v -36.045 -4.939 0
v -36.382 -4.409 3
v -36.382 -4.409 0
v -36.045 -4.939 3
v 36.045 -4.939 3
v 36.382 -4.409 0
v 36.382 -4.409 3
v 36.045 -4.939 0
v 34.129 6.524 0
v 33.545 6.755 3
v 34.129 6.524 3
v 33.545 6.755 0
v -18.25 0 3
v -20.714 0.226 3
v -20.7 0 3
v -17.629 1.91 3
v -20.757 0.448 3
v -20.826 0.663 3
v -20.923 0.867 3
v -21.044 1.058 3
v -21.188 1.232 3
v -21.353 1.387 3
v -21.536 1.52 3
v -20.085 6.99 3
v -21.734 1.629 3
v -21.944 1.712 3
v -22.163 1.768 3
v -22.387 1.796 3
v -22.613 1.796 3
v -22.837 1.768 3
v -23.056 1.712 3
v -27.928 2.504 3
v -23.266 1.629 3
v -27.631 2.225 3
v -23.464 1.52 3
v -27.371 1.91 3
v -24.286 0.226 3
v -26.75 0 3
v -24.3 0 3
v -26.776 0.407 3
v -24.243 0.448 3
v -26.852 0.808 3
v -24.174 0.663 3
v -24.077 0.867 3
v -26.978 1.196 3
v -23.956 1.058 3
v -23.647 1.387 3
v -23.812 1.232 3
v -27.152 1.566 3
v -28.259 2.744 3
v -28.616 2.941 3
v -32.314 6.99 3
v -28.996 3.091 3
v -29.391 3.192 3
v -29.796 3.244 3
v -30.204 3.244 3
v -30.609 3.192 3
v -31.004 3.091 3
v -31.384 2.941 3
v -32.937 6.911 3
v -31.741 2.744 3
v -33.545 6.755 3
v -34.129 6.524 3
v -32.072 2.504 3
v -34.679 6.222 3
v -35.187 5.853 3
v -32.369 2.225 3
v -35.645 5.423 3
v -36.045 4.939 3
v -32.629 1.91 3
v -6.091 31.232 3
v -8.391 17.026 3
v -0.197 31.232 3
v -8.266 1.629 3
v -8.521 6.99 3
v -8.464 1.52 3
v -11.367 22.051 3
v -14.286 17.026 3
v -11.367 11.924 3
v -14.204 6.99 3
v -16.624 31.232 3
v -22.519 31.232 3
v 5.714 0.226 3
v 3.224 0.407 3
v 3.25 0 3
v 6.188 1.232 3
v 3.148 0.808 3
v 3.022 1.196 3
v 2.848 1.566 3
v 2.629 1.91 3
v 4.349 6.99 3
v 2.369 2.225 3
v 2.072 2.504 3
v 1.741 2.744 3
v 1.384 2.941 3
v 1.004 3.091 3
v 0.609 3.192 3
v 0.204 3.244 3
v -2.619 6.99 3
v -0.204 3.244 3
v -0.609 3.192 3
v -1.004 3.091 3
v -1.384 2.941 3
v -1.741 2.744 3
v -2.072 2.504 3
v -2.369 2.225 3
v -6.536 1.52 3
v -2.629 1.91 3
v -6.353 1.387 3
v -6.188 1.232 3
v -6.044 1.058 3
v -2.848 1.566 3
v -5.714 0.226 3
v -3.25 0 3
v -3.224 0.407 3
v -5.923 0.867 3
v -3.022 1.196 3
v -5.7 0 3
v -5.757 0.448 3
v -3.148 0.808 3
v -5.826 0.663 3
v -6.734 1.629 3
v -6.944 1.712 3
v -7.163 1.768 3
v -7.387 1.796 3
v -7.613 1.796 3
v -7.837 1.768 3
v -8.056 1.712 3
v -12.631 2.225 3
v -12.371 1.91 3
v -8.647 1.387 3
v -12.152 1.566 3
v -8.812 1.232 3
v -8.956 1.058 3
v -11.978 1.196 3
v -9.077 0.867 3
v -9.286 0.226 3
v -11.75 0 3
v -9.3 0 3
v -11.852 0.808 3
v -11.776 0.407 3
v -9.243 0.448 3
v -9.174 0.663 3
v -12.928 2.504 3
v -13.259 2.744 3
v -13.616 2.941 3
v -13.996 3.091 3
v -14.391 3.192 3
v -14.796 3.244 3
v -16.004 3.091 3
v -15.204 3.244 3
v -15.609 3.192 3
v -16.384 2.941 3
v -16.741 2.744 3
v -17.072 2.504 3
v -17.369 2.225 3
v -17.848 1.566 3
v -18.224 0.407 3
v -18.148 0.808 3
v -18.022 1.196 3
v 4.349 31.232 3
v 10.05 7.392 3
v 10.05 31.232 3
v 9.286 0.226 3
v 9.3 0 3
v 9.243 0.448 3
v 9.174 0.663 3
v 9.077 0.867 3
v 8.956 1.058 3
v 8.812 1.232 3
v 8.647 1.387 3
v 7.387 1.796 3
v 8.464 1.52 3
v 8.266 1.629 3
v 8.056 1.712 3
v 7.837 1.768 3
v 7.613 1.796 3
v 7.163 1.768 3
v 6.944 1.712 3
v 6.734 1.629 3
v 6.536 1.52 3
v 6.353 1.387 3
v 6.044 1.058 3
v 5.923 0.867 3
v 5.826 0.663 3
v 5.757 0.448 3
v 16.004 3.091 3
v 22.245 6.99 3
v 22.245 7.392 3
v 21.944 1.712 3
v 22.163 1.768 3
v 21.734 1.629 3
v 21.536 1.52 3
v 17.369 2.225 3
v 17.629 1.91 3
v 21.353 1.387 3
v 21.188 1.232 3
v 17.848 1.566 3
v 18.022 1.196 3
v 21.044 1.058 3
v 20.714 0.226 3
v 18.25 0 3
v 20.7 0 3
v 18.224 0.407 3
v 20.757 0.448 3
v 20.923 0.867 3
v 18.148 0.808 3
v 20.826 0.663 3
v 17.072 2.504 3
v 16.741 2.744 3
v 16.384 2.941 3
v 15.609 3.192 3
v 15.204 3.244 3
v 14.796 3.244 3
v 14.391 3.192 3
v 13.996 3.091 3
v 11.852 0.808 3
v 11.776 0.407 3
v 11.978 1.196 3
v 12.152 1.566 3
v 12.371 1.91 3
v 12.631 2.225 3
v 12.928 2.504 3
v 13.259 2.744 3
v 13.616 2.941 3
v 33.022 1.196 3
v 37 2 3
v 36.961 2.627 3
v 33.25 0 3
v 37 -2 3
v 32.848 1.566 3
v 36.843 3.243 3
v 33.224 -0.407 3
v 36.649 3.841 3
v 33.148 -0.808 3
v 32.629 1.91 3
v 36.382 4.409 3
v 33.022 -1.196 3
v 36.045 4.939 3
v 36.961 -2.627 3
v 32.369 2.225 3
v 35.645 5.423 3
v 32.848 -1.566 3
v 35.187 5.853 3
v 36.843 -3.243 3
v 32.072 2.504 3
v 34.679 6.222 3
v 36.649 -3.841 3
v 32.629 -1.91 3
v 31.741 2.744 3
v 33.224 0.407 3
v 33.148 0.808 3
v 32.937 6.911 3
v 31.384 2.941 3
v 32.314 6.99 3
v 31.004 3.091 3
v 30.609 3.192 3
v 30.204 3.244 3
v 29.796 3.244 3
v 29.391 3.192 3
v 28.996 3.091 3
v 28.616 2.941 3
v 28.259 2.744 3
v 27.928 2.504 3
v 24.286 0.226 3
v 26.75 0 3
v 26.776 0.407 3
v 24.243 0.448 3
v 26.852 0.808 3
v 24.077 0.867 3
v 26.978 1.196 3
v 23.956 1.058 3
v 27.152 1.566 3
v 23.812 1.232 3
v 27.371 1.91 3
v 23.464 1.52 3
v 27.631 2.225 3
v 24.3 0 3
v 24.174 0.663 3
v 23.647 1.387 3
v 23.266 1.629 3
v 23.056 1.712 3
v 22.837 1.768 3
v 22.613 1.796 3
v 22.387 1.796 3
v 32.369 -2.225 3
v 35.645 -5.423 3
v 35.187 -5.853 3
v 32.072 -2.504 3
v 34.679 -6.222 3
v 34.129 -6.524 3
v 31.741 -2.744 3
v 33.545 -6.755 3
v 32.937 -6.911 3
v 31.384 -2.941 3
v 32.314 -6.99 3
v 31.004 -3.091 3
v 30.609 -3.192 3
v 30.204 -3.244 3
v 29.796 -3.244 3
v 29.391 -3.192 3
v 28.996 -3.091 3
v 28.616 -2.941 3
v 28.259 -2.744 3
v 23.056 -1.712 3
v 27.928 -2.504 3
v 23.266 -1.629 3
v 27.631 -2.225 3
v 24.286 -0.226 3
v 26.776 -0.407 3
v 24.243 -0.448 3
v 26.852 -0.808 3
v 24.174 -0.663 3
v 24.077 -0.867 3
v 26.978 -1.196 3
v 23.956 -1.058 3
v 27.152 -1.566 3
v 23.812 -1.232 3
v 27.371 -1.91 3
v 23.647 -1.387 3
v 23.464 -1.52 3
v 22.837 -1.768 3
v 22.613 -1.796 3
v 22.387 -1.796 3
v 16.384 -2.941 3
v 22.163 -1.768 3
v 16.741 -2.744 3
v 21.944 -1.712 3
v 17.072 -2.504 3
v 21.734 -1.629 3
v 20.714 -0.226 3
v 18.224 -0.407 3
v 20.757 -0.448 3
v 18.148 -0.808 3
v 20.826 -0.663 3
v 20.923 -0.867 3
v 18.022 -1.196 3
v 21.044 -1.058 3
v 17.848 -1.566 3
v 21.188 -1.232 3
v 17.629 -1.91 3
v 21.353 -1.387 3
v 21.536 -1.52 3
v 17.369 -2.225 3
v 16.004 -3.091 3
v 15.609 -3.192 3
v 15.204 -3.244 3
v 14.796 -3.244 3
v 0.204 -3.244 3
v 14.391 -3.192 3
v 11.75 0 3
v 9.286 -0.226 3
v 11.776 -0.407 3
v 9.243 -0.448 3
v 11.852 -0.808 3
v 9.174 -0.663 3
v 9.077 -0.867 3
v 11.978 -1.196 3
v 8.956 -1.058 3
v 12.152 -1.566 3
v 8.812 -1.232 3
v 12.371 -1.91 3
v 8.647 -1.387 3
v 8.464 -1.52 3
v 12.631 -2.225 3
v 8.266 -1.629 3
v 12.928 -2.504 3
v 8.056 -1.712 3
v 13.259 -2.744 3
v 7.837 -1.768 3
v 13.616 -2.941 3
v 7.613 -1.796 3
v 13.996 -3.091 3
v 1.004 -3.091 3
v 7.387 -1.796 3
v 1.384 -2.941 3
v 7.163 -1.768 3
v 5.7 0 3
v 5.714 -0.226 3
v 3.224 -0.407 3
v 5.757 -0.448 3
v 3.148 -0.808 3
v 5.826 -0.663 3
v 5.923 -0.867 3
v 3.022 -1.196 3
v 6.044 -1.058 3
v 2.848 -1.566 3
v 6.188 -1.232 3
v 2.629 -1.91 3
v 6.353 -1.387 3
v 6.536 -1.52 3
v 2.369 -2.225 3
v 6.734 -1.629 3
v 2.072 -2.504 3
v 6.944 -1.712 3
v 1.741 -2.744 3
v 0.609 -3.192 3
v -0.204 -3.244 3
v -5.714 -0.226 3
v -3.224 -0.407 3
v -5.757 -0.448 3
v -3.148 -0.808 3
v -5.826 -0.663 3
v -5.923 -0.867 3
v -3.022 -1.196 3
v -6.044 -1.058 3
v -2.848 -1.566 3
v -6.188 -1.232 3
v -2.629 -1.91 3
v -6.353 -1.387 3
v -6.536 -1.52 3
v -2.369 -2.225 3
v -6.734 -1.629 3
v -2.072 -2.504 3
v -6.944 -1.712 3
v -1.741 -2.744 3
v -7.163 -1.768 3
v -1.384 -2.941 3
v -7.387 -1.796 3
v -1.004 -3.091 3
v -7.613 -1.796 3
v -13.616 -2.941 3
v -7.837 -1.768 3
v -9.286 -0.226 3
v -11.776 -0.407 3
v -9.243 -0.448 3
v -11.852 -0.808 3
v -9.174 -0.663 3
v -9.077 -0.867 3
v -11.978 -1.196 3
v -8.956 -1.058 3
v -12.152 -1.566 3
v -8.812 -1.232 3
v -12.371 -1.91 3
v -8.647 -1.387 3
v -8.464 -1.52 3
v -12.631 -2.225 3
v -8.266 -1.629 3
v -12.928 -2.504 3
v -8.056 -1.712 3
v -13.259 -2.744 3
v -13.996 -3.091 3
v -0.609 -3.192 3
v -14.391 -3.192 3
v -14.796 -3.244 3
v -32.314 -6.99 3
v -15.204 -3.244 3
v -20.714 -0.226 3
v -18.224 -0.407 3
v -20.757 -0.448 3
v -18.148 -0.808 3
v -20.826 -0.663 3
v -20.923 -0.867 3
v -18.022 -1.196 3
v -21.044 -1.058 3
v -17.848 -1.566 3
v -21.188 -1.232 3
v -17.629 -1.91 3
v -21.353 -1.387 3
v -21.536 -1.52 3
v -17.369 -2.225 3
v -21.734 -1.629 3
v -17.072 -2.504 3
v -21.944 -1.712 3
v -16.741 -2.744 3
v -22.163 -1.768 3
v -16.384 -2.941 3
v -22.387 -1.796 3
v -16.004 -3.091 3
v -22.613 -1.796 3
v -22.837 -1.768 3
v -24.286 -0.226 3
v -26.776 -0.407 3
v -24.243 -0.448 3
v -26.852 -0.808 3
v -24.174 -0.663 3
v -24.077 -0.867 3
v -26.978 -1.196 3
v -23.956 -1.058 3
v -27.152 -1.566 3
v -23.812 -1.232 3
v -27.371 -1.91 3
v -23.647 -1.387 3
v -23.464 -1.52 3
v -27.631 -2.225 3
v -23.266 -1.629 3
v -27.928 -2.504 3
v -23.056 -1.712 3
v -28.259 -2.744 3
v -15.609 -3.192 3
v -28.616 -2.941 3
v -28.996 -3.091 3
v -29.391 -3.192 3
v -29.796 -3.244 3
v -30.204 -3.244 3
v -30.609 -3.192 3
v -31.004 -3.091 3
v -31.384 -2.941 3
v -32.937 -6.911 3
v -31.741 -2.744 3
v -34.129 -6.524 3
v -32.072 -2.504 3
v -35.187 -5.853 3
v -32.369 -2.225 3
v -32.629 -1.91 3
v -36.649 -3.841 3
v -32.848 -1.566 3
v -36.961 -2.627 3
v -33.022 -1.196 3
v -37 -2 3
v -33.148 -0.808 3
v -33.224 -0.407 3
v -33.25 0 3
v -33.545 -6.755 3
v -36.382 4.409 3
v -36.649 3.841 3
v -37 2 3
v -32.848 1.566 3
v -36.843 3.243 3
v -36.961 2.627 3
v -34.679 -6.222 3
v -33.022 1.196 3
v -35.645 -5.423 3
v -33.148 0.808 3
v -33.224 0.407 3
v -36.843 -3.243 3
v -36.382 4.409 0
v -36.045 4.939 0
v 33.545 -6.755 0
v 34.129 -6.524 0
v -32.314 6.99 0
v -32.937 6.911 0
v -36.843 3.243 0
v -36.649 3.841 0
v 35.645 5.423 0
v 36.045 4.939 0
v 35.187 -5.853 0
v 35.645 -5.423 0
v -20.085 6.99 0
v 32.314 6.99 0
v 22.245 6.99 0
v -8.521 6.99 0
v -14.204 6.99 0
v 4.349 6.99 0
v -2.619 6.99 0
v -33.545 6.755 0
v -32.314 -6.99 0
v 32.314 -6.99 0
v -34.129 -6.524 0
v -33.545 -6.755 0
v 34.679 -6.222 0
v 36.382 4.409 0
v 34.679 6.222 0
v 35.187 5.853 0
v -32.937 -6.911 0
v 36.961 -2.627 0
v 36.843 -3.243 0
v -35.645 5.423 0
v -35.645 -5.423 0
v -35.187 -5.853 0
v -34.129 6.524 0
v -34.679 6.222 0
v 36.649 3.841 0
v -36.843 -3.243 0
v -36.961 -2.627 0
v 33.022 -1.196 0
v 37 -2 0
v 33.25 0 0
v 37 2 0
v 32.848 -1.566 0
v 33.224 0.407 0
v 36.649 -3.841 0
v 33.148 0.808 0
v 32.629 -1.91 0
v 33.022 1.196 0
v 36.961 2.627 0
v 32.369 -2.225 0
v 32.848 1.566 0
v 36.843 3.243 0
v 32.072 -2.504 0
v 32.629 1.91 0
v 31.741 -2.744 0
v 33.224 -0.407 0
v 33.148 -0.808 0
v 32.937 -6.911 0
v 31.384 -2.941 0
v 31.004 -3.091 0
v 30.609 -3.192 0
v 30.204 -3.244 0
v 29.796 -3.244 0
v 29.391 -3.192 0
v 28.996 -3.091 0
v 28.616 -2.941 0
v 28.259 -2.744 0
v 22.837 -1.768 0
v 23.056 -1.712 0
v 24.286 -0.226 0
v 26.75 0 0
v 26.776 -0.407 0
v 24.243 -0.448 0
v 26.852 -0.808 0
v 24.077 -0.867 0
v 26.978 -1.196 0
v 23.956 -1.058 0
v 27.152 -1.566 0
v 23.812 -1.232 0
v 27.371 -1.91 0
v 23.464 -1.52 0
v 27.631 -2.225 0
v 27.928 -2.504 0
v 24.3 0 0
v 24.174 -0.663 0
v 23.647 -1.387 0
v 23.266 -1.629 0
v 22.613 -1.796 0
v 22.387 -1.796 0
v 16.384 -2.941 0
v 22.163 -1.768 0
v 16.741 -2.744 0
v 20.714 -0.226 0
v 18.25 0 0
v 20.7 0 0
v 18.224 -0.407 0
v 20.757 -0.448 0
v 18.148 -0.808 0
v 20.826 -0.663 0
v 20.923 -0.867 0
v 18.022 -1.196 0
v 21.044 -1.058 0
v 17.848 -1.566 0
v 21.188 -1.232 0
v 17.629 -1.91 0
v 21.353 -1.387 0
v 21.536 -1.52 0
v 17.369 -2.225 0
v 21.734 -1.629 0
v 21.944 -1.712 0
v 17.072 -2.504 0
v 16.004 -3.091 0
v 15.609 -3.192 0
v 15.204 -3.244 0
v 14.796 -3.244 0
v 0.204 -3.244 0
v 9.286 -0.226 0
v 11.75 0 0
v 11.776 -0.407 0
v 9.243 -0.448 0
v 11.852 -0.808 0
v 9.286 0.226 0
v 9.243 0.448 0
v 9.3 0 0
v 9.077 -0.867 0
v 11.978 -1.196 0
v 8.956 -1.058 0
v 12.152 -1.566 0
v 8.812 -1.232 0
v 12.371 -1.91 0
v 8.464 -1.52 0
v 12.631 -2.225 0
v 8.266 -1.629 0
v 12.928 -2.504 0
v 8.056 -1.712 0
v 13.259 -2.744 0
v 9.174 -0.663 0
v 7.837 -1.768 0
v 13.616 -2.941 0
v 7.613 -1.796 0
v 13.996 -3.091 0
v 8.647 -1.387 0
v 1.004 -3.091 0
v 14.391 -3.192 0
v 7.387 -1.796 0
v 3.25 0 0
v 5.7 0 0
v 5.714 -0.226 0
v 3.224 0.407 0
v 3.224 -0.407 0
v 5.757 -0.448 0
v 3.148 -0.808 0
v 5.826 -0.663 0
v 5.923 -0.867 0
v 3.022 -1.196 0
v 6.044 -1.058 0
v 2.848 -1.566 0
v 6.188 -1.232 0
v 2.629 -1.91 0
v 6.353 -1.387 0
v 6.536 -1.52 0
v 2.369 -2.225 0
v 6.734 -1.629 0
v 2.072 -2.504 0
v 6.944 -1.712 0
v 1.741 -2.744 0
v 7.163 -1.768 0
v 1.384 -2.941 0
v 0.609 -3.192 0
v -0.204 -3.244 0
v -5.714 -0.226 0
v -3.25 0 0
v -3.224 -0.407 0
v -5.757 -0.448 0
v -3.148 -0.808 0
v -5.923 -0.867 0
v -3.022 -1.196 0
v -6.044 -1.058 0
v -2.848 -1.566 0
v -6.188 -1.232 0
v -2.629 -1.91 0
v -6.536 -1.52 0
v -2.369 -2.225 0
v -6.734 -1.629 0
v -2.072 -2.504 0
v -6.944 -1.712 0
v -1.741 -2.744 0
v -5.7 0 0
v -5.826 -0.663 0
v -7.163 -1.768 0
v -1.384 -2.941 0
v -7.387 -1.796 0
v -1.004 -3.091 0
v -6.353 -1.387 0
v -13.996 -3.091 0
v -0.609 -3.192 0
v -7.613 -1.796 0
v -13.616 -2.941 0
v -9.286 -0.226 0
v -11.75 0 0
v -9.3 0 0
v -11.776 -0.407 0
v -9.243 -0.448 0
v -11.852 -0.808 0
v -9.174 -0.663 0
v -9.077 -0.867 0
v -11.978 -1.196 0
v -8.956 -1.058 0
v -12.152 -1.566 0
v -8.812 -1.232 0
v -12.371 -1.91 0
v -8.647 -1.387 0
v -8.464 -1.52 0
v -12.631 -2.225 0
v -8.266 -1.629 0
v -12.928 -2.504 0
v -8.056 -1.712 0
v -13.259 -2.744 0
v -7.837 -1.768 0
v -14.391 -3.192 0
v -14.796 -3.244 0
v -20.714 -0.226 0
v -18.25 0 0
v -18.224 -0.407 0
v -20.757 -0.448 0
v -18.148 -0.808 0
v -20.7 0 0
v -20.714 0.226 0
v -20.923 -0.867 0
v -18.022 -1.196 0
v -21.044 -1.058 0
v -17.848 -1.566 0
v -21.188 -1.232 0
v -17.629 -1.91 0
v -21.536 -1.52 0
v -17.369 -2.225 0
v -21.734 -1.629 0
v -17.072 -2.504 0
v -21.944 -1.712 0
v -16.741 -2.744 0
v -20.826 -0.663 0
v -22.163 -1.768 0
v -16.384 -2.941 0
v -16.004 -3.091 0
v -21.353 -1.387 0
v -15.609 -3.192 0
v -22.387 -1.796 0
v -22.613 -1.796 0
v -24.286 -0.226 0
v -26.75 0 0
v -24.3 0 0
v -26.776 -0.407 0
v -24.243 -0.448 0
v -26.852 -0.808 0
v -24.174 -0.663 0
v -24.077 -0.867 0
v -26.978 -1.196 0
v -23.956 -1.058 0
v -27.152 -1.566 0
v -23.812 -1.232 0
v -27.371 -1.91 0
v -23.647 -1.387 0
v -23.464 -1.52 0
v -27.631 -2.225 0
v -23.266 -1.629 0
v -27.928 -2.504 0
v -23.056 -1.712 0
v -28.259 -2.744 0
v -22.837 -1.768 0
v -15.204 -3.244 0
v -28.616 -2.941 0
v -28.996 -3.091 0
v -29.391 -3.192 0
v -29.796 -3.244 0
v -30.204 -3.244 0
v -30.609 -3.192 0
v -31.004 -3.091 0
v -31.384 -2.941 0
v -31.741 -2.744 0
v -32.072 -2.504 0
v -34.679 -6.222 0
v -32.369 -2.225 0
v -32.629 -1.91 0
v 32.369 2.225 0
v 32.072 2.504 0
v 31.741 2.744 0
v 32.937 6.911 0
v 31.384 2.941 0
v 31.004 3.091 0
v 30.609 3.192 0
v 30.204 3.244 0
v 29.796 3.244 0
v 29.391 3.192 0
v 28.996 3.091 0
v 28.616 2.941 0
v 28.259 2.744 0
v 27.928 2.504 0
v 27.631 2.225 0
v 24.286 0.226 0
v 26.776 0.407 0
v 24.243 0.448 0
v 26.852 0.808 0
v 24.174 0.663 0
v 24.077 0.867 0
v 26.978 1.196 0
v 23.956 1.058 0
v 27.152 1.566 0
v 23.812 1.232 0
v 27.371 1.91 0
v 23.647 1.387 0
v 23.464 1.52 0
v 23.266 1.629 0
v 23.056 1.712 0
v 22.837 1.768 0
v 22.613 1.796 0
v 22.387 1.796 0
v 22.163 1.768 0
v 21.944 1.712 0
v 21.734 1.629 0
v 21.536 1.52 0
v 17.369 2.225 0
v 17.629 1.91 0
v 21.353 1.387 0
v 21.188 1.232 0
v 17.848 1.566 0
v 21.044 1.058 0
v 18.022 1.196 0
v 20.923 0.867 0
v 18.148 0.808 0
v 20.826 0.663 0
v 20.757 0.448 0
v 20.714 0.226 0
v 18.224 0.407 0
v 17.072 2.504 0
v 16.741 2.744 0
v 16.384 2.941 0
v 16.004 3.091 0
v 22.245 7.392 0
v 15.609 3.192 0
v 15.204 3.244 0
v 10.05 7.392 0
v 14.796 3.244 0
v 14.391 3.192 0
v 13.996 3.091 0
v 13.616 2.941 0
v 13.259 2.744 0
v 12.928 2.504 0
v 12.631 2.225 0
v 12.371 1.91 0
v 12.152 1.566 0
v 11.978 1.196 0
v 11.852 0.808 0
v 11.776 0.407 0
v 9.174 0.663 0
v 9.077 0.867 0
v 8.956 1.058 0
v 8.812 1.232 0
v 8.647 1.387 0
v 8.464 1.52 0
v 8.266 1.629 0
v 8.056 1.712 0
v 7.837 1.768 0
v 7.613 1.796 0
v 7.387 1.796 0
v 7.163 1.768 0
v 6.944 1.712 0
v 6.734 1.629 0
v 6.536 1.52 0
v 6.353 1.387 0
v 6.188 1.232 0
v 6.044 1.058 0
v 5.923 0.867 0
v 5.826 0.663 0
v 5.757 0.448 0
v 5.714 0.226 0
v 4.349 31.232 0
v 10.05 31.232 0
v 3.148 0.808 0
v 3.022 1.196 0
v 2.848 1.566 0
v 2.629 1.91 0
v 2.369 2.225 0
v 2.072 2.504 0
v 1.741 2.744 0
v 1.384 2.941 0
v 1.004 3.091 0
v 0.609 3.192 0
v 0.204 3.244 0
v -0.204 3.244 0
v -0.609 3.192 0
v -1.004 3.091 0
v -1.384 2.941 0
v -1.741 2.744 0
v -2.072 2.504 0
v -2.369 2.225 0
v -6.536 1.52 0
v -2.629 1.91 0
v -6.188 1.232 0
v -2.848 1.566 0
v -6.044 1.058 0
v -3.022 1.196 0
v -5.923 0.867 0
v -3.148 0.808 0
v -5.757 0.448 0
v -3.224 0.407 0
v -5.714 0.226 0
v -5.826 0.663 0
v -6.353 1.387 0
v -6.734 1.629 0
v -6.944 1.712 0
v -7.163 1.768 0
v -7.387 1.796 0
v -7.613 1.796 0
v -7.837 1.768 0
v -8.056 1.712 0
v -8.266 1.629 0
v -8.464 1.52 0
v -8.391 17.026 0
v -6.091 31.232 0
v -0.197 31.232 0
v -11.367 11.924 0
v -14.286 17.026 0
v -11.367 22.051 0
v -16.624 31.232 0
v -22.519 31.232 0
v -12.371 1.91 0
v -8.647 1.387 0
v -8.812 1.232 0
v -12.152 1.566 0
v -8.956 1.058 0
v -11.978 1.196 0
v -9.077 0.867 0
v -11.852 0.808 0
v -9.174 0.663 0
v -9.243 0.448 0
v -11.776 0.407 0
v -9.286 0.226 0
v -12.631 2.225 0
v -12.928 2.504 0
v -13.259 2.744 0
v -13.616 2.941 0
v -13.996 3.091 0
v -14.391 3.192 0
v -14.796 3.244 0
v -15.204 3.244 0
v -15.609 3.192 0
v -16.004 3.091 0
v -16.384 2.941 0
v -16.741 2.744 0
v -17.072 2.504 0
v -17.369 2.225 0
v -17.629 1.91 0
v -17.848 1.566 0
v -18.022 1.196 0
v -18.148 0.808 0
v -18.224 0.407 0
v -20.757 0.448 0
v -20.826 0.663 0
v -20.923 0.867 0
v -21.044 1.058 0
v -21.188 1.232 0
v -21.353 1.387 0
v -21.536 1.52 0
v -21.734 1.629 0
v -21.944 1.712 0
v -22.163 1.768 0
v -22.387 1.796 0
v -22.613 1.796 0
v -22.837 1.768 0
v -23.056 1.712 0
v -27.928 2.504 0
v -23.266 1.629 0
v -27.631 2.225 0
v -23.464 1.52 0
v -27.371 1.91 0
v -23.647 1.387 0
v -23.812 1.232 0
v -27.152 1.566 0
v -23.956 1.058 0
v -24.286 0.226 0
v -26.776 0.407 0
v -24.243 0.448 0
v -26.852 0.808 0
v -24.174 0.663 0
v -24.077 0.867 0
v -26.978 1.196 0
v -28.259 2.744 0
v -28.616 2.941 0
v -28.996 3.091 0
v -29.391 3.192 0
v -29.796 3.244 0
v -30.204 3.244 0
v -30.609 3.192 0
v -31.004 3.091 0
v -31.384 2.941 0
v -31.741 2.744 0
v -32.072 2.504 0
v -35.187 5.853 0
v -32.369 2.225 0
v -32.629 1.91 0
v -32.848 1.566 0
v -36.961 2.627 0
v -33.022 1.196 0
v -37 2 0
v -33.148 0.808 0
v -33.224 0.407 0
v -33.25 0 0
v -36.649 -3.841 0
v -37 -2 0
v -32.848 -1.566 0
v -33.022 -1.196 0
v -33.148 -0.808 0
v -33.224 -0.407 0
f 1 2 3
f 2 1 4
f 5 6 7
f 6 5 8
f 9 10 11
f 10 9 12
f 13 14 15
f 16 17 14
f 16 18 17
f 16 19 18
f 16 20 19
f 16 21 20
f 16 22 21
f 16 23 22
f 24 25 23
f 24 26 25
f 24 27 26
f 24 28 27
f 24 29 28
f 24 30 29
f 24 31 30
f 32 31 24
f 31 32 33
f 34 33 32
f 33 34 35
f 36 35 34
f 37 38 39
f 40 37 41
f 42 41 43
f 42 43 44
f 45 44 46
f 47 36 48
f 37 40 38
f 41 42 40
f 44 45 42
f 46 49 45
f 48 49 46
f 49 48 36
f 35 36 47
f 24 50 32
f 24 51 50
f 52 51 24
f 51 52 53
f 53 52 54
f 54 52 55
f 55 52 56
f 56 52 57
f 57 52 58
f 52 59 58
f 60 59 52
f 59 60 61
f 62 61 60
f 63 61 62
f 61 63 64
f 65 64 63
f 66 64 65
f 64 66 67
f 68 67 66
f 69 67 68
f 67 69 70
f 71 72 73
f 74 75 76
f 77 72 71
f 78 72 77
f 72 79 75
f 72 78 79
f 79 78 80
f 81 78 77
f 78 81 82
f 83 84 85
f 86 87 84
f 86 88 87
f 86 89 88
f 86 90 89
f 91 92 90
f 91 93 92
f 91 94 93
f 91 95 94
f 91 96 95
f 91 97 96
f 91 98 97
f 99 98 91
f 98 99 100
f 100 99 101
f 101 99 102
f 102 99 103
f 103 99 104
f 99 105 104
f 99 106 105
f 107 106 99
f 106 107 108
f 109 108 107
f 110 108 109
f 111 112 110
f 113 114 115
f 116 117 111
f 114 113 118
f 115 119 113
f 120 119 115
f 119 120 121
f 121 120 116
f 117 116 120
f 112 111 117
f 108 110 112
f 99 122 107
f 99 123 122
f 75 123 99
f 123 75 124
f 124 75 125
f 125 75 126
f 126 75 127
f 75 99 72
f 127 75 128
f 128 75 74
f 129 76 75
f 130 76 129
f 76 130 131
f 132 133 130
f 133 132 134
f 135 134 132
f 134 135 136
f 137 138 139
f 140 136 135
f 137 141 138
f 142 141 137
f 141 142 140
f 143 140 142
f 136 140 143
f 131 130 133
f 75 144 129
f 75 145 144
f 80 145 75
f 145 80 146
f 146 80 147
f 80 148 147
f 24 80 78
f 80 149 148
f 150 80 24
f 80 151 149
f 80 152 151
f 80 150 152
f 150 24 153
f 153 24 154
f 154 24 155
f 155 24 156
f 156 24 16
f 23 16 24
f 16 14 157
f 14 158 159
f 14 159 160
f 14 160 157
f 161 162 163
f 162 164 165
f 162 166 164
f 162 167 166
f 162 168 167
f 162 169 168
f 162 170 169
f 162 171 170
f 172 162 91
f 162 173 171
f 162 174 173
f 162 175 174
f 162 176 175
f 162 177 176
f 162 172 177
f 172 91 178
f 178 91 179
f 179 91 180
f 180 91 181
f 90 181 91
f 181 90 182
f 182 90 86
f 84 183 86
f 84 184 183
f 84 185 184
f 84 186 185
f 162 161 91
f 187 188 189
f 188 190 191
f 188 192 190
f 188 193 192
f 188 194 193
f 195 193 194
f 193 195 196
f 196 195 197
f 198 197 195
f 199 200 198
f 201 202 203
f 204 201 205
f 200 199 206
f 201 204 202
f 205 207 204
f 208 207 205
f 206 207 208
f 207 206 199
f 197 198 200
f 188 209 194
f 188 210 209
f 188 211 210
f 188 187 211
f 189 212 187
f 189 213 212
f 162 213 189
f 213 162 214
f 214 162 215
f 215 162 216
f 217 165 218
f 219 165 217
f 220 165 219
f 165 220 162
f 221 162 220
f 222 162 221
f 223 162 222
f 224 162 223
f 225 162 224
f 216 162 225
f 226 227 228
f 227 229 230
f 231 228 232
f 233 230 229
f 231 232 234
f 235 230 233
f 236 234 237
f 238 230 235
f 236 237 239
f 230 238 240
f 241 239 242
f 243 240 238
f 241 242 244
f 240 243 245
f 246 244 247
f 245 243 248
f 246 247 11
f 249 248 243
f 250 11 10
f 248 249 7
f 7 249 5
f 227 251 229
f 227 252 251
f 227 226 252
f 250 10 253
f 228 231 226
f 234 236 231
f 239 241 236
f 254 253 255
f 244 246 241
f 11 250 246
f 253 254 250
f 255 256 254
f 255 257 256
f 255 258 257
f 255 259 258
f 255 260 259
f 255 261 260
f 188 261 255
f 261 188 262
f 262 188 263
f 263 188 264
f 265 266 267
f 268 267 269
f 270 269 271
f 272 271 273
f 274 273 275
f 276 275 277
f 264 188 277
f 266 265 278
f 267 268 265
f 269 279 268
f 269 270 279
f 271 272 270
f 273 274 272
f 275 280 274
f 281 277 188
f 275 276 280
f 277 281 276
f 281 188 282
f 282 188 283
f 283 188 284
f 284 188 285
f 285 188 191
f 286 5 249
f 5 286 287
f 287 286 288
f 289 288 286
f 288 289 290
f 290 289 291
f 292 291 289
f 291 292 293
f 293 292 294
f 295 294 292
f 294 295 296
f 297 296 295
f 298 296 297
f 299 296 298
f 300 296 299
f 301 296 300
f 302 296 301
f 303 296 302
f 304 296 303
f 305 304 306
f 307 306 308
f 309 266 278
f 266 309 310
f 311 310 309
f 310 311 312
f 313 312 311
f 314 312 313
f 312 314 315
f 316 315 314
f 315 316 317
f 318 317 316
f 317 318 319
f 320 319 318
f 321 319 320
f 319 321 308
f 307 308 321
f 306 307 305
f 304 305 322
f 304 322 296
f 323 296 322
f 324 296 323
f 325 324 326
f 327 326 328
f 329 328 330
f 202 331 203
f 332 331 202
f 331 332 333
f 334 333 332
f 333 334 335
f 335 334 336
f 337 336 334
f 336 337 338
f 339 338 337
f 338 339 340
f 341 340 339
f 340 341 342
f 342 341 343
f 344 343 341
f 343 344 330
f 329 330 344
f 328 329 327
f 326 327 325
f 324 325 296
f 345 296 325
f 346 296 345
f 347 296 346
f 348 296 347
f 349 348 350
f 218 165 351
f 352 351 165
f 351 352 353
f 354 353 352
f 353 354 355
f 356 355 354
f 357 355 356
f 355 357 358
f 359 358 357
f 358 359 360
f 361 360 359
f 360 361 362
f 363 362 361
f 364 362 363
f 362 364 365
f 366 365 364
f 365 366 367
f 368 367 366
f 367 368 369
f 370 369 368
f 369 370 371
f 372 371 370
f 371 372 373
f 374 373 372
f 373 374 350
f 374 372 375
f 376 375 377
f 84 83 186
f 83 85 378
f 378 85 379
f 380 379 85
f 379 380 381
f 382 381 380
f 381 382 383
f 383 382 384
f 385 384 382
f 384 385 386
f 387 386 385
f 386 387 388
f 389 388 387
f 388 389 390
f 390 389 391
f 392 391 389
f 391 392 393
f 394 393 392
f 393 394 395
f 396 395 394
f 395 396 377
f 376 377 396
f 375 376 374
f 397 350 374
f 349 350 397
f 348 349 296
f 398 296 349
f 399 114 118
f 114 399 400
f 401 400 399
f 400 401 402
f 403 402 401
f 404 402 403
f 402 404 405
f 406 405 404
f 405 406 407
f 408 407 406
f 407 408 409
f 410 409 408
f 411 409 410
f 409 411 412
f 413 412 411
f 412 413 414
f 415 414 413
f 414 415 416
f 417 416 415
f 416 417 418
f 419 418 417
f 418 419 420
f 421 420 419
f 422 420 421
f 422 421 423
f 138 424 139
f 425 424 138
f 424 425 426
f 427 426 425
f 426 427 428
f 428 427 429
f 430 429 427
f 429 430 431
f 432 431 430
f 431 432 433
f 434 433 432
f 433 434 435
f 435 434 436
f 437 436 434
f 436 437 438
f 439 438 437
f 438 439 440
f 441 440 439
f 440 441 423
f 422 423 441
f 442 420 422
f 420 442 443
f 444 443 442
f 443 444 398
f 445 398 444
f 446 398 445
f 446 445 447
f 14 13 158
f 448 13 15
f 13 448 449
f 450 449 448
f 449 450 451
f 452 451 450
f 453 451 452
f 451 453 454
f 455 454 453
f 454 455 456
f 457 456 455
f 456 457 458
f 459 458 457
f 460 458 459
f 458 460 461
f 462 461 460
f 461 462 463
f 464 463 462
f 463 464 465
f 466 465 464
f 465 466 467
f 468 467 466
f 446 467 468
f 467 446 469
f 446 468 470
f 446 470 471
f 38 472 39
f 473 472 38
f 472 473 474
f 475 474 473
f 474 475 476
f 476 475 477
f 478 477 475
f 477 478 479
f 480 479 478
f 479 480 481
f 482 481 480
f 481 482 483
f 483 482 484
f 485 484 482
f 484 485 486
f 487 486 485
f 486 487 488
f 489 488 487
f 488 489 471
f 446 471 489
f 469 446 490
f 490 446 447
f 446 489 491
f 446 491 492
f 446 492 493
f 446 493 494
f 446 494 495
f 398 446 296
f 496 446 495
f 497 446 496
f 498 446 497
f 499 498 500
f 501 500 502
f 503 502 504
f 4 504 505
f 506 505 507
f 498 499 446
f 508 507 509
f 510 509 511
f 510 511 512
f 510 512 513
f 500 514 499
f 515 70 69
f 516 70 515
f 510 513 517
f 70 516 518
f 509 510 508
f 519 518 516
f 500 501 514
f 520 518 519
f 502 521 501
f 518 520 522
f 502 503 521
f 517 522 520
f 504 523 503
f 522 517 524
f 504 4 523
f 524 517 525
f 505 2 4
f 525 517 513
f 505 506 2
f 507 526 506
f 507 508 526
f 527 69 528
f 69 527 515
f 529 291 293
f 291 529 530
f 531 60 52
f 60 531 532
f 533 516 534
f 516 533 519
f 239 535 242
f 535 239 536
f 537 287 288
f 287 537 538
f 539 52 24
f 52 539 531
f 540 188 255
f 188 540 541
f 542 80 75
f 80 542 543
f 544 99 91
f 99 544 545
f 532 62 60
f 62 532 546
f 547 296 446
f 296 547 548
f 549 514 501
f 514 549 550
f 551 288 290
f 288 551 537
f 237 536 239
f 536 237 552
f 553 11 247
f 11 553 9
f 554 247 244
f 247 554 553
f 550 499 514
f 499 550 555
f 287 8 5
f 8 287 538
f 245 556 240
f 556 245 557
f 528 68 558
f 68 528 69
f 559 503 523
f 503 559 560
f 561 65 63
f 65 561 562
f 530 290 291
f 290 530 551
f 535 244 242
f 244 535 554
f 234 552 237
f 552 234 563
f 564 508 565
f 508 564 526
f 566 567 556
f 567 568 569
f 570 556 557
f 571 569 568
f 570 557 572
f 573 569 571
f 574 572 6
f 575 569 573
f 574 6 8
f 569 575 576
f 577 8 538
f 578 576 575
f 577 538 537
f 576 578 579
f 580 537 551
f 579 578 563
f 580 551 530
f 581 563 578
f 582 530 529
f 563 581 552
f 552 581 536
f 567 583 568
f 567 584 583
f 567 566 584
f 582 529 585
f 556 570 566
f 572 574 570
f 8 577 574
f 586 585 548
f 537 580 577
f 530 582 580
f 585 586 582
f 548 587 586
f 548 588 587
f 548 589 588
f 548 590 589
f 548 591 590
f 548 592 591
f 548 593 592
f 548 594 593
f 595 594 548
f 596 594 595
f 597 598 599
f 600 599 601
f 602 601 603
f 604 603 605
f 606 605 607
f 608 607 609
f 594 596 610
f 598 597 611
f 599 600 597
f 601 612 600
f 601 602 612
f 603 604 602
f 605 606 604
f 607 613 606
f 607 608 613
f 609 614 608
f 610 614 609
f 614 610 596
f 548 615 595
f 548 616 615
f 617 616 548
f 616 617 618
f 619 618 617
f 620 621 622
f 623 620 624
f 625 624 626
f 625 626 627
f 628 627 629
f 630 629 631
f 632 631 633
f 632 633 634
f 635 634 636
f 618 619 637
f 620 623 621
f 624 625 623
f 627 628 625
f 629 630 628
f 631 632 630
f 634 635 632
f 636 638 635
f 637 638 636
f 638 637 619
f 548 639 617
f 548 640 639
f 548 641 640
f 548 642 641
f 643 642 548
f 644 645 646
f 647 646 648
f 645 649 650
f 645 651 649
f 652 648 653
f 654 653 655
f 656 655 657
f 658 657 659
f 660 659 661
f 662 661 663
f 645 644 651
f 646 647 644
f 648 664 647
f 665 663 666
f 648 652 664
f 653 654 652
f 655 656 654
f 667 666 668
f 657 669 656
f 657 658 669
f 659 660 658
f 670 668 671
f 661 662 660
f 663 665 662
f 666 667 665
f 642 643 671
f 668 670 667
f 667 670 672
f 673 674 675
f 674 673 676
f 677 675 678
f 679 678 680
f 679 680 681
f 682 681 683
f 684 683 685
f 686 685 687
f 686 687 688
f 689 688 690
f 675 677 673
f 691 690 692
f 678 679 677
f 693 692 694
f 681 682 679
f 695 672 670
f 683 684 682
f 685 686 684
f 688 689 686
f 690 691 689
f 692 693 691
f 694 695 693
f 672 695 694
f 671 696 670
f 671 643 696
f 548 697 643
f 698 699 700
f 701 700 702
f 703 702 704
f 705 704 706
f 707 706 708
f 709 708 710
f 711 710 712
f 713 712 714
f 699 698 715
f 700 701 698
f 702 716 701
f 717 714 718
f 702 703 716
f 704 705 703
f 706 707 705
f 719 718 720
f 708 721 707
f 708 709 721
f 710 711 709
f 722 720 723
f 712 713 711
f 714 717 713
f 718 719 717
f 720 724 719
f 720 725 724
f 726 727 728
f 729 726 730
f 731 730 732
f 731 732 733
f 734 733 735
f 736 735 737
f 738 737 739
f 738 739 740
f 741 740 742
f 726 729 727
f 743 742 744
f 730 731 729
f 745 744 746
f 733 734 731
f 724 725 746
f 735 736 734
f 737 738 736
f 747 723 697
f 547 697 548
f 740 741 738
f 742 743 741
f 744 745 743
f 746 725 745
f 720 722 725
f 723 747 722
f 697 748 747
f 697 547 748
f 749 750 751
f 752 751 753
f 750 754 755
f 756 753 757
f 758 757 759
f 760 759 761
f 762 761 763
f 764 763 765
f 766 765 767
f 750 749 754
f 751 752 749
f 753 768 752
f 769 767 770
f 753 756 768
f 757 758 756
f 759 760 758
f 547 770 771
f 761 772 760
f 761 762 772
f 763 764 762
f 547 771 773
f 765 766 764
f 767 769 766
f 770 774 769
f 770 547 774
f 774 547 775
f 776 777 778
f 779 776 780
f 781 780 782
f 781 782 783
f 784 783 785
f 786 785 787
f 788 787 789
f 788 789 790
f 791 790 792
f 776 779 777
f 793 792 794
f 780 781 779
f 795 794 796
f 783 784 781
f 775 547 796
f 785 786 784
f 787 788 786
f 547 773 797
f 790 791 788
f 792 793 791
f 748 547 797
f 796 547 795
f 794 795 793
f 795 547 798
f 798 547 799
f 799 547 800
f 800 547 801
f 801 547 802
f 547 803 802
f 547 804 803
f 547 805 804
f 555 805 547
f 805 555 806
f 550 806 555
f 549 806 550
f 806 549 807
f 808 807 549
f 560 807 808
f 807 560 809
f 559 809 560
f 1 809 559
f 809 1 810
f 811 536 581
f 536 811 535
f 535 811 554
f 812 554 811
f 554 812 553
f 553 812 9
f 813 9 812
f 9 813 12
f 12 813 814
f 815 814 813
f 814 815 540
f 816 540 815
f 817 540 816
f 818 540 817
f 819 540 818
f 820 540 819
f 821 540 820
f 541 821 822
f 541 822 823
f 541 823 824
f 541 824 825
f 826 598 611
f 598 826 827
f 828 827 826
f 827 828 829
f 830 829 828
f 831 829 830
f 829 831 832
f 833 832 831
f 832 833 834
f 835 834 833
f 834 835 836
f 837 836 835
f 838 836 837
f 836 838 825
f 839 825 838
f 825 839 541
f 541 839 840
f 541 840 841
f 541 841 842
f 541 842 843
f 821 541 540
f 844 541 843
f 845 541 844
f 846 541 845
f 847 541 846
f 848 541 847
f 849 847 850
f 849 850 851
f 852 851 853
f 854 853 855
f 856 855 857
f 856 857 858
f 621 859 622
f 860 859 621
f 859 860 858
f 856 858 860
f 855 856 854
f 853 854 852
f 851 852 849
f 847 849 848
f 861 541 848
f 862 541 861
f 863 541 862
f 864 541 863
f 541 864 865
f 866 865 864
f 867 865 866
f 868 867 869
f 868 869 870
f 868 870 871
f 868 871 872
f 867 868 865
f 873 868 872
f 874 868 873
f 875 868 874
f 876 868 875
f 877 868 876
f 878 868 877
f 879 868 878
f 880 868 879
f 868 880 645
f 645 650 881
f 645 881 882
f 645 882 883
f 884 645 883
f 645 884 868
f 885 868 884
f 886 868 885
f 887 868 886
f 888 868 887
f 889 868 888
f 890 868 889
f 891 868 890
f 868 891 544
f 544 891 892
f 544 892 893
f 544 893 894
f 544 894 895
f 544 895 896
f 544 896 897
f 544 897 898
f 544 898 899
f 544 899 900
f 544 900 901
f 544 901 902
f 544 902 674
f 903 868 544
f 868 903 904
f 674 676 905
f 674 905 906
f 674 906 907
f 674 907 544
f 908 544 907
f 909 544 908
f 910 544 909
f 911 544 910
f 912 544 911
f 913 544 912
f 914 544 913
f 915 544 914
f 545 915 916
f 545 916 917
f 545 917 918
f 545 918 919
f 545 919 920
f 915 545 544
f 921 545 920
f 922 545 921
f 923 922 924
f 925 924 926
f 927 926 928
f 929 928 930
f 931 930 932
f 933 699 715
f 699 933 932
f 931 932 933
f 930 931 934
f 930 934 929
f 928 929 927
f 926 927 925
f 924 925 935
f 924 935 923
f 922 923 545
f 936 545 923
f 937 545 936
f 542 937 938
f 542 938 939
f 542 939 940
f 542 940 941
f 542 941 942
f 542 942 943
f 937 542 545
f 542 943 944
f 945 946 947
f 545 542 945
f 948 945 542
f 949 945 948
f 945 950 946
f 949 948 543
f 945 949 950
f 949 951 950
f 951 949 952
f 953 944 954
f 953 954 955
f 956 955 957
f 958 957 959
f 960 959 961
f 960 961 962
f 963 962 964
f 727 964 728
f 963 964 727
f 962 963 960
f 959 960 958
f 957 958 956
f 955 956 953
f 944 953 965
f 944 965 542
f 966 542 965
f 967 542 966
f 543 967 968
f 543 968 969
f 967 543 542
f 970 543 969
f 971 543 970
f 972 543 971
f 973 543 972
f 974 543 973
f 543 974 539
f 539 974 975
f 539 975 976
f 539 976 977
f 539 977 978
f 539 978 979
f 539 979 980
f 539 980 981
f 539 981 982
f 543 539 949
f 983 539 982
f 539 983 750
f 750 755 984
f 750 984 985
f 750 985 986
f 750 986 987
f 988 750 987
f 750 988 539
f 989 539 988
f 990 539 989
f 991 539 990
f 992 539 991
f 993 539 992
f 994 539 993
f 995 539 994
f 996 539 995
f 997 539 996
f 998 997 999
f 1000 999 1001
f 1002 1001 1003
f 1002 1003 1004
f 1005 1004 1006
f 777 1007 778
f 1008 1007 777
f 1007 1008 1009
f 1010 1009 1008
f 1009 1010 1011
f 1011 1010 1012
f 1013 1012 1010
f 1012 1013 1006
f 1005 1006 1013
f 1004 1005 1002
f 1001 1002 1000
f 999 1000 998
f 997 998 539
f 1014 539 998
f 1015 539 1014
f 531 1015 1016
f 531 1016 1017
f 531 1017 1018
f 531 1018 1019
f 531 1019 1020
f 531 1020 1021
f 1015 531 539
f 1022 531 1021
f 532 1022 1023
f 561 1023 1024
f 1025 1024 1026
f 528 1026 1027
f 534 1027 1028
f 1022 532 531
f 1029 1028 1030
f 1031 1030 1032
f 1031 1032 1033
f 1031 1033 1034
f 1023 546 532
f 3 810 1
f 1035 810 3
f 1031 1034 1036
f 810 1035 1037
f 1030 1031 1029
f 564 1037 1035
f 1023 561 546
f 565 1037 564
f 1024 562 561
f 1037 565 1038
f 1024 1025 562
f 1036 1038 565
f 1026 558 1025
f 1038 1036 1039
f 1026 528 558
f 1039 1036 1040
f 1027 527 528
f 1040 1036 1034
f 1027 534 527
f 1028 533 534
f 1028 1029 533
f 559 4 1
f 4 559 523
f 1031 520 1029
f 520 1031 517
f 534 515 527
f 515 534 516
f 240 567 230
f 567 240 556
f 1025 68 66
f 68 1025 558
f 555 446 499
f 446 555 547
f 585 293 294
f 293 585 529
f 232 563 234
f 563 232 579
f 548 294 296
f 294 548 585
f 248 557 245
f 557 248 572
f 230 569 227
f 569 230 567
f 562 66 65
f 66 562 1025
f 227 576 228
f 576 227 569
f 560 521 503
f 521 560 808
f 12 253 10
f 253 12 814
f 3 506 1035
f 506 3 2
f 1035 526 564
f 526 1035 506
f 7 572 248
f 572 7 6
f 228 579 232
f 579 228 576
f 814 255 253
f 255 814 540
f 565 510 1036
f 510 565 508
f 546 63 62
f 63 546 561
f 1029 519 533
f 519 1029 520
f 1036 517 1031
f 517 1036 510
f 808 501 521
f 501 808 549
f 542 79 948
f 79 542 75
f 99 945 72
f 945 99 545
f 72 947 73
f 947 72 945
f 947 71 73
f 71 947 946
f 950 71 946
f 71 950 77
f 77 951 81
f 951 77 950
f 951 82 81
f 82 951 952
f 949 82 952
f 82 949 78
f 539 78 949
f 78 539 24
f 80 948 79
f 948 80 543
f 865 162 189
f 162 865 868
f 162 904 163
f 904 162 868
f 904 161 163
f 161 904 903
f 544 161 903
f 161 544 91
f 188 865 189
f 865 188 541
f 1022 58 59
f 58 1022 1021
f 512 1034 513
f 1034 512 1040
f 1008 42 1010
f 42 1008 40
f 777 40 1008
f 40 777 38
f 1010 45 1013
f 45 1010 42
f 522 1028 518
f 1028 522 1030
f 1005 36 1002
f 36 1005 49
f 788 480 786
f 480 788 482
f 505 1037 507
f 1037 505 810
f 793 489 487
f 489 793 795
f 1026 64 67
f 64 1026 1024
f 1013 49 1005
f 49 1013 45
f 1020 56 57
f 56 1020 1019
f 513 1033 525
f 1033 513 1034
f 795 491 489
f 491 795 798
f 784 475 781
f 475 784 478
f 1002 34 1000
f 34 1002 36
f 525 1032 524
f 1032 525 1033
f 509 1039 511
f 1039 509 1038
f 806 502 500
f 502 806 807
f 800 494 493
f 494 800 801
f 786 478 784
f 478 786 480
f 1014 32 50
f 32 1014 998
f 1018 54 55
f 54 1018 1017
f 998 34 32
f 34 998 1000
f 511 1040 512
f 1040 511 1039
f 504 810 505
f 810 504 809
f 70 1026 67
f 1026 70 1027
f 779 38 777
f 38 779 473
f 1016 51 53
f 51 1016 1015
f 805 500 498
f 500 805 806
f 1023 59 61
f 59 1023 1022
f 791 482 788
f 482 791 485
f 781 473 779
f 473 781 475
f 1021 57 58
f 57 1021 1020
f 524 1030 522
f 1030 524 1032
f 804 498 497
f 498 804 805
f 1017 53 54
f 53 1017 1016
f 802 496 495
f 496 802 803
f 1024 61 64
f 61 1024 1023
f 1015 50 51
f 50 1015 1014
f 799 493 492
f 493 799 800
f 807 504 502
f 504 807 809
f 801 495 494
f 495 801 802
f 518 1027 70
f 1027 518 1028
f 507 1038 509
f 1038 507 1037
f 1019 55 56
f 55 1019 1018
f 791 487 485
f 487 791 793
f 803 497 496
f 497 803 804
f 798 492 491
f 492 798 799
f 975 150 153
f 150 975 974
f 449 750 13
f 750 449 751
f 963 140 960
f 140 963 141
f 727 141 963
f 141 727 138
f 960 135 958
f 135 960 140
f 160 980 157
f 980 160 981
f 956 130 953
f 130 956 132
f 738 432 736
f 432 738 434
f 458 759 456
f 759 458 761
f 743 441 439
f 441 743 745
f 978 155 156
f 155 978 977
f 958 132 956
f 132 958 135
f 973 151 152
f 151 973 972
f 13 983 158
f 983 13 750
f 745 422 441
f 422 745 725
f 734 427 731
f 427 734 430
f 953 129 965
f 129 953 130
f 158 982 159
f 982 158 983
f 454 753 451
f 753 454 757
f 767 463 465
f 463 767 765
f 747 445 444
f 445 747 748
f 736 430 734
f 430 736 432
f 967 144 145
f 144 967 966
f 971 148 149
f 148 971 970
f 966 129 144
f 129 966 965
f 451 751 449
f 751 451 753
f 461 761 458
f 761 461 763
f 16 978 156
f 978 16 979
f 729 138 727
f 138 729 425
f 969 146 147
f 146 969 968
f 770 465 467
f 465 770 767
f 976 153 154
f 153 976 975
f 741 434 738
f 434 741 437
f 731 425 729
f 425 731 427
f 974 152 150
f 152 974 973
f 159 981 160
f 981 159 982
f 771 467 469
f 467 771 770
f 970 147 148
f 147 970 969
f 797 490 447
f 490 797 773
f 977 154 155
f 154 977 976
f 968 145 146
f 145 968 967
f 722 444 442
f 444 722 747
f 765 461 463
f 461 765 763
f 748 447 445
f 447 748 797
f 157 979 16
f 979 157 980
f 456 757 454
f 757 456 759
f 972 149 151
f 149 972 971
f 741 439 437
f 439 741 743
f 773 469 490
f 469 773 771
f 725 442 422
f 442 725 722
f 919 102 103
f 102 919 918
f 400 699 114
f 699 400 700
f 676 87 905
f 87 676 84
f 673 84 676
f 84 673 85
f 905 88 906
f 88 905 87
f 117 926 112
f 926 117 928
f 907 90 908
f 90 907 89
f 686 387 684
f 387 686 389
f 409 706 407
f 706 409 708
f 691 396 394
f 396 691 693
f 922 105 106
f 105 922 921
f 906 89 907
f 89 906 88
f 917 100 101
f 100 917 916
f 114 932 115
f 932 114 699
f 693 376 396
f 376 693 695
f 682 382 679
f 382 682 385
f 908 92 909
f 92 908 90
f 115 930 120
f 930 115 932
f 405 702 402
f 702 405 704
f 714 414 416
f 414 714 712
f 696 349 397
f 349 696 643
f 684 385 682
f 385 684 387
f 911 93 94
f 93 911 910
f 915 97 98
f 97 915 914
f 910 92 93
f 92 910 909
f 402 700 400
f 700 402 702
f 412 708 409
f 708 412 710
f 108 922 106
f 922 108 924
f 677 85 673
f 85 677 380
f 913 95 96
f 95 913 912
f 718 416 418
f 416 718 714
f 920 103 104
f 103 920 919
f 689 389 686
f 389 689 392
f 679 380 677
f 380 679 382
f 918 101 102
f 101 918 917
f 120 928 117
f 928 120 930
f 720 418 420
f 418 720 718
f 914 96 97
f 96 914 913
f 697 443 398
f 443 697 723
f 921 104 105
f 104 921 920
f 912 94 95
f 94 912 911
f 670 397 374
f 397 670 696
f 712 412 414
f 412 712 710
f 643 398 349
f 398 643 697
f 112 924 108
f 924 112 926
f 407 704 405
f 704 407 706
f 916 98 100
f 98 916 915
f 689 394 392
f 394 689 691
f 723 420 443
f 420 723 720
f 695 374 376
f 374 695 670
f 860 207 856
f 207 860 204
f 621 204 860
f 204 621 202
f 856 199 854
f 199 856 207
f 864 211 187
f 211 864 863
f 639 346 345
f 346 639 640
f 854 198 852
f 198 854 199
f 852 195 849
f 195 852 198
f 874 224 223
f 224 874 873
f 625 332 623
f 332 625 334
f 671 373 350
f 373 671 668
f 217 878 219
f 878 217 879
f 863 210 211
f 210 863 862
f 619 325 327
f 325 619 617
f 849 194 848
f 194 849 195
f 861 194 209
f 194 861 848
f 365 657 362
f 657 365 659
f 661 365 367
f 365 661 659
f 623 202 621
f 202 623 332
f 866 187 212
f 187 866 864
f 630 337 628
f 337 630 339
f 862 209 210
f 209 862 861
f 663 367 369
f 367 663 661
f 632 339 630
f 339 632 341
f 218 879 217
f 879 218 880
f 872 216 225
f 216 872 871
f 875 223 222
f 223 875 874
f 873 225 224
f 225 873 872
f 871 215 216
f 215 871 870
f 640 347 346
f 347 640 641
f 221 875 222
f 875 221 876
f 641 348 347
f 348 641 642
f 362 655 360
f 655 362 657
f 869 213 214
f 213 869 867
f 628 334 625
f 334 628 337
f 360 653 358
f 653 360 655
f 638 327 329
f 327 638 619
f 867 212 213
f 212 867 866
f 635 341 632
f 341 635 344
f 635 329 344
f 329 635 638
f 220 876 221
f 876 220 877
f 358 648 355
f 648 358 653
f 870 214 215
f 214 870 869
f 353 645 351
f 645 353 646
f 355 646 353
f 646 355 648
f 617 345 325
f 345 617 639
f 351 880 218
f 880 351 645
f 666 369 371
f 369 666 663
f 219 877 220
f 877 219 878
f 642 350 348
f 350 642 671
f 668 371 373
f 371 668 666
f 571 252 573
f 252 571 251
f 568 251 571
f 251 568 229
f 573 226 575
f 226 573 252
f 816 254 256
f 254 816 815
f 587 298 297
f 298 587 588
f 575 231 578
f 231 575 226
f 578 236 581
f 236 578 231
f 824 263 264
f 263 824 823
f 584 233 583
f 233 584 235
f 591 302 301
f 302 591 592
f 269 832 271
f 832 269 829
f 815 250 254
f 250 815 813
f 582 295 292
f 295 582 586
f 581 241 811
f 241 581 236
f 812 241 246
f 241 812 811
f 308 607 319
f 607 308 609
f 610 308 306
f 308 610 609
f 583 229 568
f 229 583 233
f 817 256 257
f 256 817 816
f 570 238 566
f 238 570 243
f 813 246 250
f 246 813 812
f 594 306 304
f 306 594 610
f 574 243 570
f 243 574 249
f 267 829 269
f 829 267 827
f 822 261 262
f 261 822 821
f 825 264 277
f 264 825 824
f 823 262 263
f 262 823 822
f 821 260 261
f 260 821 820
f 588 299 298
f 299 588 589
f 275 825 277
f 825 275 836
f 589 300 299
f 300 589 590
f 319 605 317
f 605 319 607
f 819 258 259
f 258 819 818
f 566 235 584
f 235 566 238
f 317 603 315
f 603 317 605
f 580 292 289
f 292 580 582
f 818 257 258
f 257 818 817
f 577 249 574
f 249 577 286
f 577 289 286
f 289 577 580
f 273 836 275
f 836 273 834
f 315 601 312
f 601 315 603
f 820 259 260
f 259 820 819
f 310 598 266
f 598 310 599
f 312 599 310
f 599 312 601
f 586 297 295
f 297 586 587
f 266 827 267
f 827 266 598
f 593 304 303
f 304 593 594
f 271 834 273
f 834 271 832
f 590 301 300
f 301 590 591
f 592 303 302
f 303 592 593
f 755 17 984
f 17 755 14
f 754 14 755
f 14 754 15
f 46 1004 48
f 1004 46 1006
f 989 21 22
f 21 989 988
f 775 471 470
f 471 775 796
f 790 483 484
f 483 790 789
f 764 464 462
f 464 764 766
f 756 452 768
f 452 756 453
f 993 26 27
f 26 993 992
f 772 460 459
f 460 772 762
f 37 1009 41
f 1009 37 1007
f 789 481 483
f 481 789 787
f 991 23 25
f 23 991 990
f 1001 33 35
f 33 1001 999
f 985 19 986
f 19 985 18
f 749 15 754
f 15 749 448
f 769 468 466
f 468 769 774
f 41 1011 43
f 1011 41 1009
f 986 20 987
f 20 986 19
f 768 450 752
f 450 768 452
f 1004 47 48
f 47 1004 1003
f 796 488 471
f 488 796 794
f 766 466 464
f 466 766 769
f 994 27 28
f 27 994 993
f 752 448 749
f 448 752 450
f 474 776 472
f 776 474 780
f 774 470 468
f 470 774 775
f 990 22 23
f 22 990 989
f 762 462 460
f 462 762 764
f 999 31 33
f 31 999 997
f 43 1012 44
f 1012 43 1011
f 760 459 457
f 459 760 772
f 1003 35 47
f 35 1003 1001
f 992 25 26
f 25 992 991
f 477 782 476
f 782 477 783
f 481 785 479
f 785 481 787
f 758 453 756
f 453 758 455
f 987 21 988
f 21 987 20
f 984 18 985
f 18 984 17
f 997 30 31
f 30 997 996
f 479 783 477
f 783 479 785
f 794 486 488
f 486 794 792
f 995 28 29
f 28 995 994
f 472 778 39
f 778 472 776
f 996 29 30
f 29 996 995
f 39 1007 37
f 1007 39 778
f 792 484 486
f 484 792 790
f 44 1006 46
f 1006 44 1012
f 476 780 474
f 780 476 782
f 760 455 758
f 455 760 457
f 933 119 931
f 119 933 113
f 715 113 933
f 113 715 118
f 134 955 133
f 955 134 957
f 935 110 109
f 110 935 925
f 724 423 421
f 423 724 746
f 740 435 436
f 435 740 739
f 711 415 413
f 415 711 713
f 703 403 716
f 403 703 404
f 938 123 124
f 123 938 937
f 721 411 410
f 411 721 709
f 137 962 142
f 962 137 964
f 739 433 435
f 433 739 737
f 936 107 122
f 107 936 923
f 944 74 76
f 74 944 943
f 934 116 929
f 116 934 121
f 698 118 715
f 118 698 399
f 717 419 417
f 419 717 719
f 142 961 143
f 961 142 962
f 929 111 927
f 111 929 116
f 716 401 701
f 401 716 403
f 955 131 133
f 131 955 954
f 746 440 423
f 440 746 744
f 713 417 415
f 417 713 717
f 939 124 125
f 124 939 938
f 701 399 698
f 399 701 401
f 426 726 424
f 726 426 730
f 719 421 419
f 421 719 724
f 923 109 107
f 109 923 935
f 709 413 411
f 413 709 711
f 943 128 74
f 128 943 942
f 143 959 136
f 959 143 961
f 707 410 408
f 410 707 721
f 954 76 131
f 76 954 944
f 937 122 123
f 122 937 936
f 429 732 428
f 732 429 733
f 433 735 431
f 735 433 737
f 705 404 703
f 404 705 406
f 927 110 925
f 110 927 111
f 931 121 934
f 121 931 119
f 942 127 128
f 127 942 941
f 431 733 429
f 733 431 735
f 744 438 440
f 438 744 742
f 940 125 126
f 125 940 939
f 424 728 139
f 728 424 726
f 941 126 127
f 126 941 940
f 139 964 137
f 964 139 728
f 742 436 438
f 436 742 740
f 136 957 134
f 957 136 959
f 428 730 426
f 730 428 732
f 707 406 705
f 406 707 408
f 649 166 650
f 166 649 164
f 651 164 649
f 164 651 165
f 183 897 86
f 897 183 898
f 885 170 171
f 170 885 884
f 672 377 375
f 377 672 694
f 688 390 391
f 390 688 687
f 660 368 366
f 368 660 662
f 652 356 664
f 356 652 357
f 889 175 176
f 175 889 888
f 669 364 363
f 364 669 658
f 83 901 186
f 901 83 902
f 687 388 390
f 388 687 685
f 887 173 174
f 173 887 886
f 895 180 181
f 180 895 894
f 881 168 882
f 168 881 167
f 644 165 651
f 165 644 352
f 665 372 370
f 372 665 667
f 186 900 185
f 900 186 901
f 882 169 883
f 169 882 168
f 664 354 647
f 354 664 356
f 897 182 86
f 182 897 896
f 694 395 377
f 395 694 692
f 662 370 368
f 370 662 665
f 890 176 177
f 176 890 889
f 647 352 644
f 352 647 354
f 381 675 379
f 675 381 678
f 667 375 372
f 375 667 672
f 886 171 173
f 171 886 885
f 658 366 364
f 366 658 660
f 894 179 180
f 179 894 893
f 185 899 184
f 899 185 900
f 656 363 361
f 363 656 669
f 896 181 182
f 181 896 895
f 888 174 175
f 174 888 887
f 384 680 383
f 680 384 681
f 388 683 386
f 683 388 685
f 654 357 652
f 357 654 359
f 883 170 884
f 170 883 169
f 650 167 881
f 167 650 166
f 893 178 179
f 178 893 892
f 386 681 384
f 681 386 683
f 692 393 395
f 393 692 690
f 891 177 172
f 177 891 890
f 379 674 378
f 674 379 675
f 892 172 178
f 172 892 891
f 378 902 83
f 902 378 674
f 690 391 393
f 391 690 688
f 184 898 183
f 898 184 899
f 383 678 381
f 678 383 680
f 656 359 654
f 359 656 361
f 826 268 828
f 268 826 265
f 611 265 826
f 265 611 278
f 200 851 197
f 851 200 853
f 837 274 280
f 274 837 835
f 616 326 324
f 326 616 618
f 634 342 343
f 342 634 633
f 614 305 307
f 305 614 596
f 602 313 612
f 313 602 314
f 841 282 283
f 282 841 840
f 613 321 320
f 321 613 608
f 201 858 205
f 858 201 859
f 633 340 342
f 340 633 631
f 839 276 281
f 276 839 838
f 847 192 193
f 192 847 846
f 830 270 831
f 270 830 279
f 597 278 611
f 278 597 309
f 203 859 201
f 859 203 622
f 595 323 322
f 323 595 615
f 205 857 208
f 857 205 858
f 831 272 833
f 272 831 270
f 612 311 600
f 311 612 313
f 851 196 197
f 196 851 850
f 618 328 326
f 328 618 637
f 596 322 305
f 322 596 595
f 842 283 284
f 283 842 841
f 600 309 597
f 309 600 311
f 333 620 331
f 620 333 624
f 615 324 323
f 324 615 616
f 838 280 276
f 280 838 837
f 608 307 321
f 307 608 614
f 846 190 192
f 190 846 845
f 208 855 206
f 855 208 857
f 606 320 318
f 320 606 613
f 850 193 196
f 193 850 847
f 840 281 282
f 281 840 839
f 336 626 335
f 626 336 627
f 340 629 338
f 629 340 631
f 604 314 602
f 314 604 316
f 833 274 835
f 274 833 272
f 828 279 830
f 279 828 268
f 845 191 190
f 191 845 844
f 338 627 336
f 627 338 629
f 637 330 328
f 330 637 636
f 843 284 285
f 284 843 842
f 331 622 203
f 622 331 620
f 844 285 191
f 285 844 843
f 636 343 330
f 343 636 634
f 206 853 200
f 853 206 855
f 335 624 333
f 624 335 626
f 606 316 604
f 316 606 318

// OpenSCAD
$fn = 50;


difference() {
	union() {
		hull() {
			translate(v = [-32.0000000000, 2.0000000000, 0]) {
				cylinder(h = 3, r = 5);
			}
			translate(v = [32.0000000000, 2.0000000000, 0]) {
				cylinder(h = 3, r = 5);
			}
			translate(v = [-32.0000000000, -2.0000000000, 0]) {
				cylinder(h = 3, r = 5);
			}
			translate(v = [32.0000000000, -2.0000000000, 0]) {
				cylinder(h = 3, r = 5);
			}
		}
		translate(v = [0, 30.5555555556, 0]) {
			linear_extrude(height = 3) {
				text(font = "DejaVu Sans Mono:style=Bold", halign = "center", size = 28.5000000000, text = "XL", valign = "top");
			}
		}
	}
	union() {
		translate(v = [-30.0000000000, 0.0000000000, 0]) {
			translate(v = [0, 0, -100]) {
				cylinder(h = 200, r = 3.2500000000);
			}
		}
		translate(v = [-15.0000000000, 0.0000000000, 0]) {
			translate(v = [0, 0, -100]) {
				cylinder(h = 200, r = 3.2500000000);
			}
		}
		translate(v = [0, 0, -100]) {
			cylinder(h = 200, r = 3.2500000000);
		}
		translate(v = [15.0000000000, 0.0000000000, 0]) {
			translate(v = [0, 0, -100]) {
				cylinder(h = 200, r = 3.2500000000);
			}
		}
		translate(v = [30.0000000000, 0.0000000000, 0]) {
			translate(v = [0, 0, -100]) {
				cylinder(h = 200, r = 3.2500000000);
			}
		}
		translate(v = [-30.0000000000, 0.0000000000, 0]) {
			translate(v = [0, 0, -100]) {
				cylinder(h = 200, r = 1.8000000000);
			}
		}
		translate(v = [-22.5000000000, 0.0000000000, 0]) {
			translate(v = [0, 0, -100]) {
				cylinder(h = 200, r = 1.8000000000);
			}
		}
		translate(v = [-15.0000000000, 0.0000000000, 0]) {
			translate(v = [0, 0, -100]) {
				cylinder(h = 200, r = 1.8000000000);
			}
		}
		translate(v = [-7.5000000000, 0.0000000000, 0]) {
			translate(v = [0, 0, -100]) {
				cylinder(h = 200, r = 1.8000000000);
			}
		}
		translate(v = [0, 0, -100]) {
			cylinder(h = 200, r = 1.8000000000);
		}
		translate(v = [7.5000000000, 0.0000000000, 0]) {
			translate(v = [0, 0, -100]) {
				cylinder(h = 200, r = 1.8000000000);
			}
		}
		translate(v = [15.0000000000, 0.0000000000, 0]) {
			translate(v = [0, 0, -100]) {
				cylinder(h = 200, r = 1.8000000000);
			}
		}
		translate(v = [22.5000000000, 0.0000000000, 0]) {
			translate(v = [0, 0, -100]) {
				cylinder(h = 200, r = 1.8000000000);
			}
		}
		translate(v = [30.0000000000, 0.0000000000, 0]) {
			translate(v = [0, 0, -100]) {
				cylinder(h = 200, r = 1.8000000000);
			}
		}
	}
}
